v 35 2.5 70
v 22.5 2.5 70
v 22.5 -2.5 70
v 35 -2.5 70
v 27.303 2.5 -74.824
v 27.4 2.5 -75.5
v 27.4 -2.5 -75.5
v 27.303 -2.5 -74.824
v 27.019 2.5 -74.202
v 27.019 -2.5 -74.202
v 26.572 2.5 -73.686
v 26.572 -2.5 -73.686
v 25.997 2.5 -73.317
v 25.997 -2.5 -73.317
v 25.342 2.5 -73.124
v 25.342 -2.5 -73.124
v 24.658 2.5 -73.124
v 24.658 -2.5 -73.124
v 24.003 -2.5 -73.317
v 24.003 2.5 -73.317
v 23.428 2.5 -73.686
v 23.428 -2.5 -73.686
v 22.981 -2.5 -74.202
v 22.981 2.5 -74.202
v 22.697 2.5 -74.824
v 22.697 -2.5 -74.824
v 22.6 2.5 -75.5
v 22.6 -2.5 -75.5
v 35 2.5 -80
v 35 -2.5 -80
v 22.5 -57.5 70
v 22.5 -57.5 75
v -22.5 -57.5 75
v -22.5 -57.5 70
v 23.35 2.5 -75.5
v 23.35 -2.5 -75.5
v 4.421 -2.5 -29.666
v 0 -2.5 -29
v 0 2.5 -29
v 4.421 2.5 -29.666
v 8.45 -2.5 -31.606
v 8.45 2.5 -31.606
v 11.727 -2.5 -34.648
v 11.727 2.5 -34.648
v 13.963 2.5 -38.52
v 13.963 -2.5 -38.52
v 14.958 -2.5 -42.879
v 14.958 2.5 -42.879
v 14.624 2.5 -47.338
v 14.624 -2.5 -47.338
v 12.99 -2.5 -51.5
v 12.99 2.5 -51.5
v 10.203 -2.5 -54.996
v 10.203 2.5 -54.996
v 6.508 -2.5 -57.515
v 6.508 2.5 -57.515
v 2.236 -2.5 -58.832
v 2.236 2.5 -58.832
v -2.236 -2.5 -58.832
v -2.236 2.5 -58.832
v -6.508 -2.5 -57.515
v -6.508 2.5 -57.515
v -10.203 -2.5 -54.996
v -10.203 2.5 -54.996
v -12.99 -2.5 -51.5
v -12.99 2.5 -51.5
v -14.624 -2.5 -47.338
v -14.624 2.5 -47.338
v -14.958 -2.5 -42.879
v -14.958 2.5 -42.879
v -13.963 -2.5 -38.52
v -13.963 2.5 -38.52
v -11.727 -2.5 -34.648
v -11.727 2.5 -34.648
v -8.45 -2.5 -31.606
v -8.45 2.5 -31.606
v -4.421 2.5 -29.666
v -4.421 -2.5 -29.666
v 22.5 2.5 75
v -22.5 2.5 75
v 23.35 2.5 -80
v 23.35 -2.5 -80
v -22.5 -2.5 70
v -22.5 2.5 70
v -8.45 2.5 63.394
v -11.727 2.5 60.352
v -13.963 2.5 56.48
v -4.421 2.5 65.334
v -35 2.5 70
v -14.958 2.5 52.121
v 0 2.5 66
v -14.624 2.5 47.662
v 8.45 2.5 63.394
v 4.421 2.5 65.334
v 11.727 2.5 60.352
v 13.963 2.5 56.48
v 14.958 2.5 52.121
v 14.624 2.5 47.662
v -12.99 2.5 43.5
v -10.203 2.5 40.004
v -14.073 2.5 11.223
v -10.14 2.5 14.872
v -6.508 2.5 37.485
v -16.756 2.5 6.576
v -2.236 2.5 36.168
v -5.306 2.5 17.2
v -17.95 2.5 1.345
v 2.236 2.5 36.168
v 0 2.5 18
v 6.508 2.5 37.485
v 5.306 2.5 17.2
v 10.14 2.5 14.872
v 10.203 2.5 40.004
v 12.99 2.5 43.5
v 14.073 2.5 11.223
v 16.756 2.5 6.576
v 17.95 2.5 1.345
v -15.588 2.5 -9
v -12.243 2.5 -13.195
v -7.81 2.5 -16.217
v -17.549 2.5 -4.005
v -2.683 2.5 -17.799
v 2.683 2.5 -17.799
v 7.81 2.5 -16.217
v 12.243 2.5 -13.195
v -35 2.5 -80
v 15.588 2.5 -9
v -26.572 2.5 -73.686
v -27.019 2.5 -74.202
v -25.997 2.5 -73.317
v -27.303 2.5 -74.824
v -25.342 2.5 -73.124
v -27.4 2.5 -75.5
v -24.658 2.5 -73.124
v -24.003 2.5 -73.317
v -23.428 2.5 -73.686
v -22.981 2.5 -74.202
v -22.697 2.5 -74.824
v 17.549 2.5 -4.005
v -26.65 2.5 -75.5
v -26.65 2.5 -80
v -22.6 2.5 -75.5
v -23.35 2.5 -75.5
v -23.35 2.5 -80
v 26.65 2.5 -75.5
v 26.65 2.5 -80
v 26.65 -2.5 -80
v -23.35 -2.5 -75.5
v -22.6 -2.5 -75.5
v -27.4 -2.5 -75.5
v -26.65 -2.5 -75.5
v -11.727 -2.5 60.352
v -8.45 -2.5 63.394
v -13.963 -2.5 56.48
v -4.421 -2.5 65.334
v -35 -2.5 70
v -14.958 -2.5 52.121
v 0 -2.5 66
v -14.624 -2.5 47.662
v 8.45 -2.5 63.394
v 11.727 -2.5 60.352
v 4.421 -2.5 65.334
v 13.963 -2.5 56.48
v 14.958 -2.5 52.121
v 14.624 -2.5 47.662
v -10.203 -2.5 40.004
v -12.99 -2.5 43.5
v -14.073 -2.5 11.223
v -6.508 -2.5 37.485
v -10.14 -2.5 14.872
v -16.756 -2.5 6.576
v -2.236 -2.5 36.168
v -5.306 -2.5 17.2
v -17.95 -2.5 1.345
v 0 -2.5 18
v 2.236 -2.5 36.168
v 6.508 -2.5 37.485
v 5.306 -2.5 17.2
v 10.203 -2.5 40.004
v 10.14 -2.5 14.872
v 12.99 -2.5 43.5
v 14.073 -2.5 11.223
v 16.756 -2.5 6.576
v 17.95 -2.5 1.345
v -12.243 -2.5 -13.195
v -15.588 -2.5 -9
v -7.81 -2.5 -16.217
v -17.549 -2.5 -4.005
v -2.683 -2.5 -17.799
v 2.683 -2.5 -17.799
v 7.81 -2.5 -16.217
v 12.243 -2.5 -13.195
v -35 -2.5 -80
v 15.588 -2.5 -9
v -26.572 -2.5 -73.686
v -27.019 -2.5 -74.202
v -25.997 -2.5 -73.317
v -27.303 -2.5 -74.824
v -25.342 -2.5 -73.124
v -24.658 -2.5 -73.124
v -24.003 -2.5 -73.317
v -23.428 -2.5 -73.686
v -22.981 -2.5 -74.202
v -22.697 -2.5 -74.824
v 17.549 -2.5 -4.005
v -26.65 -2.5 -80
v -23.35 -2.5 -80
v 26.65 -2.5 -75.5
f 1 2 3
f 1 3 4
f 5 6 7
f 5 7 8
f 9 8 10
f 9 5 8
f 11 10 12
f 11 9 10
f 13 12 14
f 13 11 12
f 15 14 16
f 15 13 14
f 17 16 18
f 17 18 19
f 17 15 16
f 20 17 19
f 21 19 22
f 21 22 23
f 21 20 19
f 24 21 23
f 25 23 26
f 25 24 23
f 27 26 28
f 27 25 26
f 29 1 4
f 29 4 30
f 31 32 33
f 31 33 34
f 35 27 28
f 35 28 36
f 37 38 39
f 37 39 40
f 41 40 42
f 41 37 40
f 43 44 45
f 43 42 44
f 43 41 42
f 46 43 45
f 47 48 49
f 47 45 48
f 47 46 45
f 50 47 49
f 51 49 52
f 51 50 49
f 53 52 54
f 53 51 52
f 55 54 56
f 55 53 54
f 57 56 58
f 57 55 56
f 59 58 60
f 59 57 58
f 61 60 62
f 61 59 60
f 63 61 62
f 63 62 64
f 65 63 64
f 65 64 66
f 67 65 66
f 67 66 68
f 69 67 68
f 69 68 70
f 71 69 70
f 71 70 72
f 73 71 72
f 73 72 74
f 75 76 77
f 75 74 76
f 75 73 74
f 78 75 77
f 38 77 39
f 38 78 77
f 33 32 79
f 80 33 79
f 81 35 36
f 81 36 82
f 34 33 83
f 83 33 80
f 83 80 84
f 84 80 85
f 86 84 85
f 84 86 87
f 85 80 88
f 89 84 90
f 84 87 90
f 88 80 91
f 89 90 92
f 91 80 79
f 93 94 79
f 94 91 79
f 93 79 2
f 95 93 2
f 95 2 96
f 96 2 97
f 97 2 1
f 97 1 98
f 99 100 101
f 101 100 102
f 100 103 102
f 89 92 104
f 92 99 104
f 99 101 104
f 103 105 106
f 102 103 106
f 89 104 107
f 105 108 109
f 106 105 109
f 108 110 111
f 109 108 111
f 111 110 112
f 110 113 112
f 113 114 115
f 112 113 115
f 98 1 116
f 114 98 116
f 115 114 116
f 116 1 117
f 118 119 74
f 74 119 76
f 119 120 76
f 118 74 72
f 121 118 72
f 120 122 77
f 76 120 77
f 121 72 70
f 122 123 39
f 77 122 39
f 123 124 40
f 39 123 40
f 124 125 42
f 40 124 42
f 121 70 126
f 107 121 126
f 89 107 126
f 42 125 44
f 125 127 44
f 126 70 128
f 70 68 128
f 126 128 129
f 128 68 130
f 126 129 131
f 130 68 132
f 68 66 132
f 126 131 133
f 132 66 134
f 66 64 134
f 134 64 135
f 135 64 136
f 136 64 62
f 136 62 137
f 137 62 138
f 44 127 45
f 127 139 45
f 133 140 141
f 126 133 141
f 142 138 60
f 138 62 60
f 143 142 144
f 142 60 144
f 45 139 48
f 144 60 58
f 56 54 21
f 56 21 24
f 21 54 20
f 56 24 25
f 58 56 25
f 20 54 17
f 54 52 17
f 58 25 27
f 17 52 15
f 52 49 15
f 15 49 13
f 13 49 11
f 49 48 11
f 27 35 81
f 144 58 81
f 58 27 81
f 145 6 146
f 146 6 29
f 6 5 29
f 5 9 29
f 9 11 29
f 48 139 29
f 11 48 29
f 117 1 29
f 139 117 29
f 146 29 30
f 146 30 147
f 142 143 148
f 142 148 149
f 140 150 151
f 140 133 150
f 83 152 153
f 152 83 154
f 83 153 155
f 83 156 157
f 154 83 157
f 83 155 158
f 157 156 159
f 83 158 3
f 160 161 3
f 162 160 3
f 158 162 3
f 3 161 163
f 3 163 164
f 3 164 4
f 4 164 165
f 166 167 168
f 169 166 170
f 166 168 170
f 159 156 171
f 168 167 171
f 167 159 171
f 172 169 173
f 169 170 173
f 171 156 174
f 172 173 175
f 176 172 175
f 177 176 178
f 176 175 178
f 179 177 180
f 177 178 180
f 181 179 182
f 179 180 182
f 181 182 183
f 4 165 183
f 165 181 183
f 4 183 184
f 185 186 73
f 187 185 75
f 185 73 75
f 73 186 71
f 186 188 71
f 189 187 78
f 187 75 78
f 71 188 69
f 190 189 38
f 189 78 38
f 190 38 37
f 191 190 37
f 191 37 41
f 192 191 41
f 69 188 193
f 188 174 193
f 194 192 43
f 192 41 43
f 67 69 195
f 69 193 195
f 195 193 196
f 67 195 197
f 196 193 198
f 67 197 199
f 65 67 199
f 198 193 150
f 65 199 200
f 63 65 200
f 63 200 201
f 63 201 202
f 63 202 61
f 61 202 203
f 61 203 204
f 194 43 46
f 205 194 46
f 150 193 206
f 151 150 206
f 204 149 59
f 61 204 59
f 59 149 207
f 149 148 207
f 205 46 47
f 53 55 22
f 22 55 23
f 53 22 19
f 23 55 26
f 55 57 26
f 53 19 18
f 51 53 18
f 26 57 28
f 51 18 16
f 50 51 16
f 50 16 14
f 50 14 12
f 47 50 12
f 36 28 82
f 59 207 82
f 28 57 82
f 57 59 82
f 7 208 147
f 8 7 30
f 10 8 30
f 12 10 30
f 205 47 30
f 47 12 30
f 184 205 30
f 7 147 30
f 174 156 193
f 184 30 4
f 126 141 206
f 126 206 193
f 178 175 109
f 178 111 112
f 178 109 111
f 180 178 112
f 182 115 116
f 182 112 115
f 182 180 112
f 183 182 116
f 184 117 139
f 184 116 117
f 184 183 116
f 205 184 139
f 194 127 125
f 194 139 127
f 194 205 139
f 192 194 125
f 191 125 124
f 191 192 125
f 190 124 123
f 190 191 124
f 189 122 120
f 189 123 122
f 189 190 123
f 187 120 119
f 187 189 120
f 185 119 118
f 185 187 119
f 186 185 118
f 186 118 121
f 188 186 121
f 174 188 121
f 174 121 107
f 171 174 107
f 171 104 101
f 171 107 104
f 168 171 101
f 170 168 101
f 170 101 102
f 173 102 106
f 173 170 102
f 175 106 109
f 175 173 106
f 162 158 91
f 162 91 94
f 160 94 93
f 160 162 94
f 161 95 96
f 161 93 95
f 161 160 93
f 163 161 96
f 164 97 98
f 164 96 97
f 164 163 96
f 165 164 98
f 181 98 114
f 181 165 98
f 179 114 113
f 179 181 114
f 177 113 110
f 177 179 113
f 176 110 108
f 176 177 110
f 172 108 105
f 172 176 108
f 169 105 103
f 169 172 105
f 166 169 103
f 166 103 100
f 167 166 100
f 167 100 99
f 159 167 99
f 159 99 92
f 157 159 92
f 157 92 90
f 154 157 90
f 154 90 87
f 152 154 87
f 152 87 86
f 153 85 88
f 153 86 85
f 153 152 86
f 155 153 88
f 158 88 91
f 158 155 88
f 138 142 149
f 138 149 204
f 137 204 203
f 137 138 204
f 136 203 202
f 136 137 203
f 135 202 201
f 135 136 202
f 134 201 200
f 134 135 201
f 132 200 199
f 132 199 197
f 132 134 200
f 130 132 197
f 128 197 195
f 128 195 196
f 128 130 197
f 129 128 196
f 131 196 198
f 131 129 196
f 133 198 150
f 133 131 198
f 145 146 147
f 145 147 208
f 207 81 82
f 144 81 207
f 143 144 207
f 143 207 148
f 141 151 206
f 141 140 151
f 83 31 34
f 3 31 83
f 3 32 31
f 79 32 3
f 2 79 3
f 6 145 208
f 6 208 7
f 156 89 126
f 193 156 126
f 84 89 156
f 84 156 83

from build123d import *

# Parameters (mm, degrees)
BOSS_EXTRUDE1_DEPTH     = 2.5
SKETCH4_W               = 41.785
SKETCH4_H               = 150
CUT_EXTRUDE1_DEPTH      = 120
SKETCH5_W               = 5
SKETCH5_H               = 60
BOSS_EXTRUDE2_DEPTH     = 22.5
CUT_EXTRUDE2_DEPTH      = 106.948100502
CUT_EXTRUDE2_DEPTH_BACK = 106.948100502
SKETCH3_R               = 15
SKETCH3_R_2             = 18


with BuildPart() as part:
    # Sketch2 → Boss-Extrude1 (new, symmetric)
    with BuildSketch(Plane(origin=(0, 0, 0), x_dir=(1, 0, 0), z_dir=(0, 1, 0))):
        with BuildLine():
            Line((-26.65, 80), (-76.785, 80))
            Line((-76.785, 80), (-76.785, -70))
            Line((-76.785, -70), (76.785, -70))
            Line((76.785, -70), (76.785, 80))
            Line((76.785, 80), (26.65, 80))
            Line((26.65, 80), (26.65, 75.5))
            Line((26.65, 75.5), (27.4, 75.5))
            ThreePointArc((27.4, 75.5), (25, 73.1), (22.6, 75.5))
            Line((22.6, 75.5), (23.35, 75.5))
            Line((23.35, 75.5), (23.35, 80))
            Line((23.35, 80), (-23.35, 80))
            Line((-23.35, 80), (-23.35, 75.5))
            Line((-23.35, 75.5), (-22.6, 75.5))
            ThreePointArc((-22.6, 75.5), (-25, 73.1), (-27.4, 75.5))
            Line((-27.4, 75.5), (-26.65, 75.5))
            Line((-26.65, 75.5), (-26.65, 80))
        make_face()
    extrude(amount=BOSS_EXTRUDE1_DEPTH, both=True)

    # Sketch4 → Cut-Extrude1 (cut)
    with BuildSketch(Plane(origin=(0, 2.5, 0), x_dir=(1, 0, 0), z_dir=(0, 1, 0))):
        with Locations((-55.8925, 5)):
            Rectangle(SKETCH4_W, SKETCH4_H)
        with Locations((55.8925, 5)):
            Rectangle(SKETCH4_W, SKETCH4_H)
    extrude(amount=-CUT_EXTRUDE1_DEPTH, mode=Mode.SUBTRACT)

    # Sketch5 → Boss-Extrude2 (add, symmetric)
    with BuildSketch(Plane(origin=(0, 0, 0), x_dir=(0, 0, -1), z_dir=(1, 0, 0))):
        with Locations((-72.5, -27.5)):
            Rectangle(SKETCH5_W, SKETCH5_H)
    extrude(amount=BOSS_EXTRUDE2_DEPTH, both=True)

    # Sketch3 → Cut-Extrude2 (cut, two sides: drawn at the far end of the back side and taken through both)
    with BuildSketch(Plane(origin=(0, 2.5, 0), x_dir=(1, 0, 0), z_dir=(0, 1, 0)).offset(-CUT_EXTRUDE2_DEPTH_BACK)):
        with Locations(Location((0, 44, 0), (0, 0, 270))):
            Circle(SKETCH3_R)
        with Locations(Location((0, -51, 0), (0, 0, 270))):
            Circle(SKETCH3_R)
        with Locations(Location((0, 0, 0), (0, 0, 270))):
            Circle(SKETCH3_R_2)
    extrude(amount=CUT_EXTRUDE2_DEPTH + CUT_EXTRUDE2_DEPTH_BACK, mode=Mode.SUBTRACT)


solid = part.part
